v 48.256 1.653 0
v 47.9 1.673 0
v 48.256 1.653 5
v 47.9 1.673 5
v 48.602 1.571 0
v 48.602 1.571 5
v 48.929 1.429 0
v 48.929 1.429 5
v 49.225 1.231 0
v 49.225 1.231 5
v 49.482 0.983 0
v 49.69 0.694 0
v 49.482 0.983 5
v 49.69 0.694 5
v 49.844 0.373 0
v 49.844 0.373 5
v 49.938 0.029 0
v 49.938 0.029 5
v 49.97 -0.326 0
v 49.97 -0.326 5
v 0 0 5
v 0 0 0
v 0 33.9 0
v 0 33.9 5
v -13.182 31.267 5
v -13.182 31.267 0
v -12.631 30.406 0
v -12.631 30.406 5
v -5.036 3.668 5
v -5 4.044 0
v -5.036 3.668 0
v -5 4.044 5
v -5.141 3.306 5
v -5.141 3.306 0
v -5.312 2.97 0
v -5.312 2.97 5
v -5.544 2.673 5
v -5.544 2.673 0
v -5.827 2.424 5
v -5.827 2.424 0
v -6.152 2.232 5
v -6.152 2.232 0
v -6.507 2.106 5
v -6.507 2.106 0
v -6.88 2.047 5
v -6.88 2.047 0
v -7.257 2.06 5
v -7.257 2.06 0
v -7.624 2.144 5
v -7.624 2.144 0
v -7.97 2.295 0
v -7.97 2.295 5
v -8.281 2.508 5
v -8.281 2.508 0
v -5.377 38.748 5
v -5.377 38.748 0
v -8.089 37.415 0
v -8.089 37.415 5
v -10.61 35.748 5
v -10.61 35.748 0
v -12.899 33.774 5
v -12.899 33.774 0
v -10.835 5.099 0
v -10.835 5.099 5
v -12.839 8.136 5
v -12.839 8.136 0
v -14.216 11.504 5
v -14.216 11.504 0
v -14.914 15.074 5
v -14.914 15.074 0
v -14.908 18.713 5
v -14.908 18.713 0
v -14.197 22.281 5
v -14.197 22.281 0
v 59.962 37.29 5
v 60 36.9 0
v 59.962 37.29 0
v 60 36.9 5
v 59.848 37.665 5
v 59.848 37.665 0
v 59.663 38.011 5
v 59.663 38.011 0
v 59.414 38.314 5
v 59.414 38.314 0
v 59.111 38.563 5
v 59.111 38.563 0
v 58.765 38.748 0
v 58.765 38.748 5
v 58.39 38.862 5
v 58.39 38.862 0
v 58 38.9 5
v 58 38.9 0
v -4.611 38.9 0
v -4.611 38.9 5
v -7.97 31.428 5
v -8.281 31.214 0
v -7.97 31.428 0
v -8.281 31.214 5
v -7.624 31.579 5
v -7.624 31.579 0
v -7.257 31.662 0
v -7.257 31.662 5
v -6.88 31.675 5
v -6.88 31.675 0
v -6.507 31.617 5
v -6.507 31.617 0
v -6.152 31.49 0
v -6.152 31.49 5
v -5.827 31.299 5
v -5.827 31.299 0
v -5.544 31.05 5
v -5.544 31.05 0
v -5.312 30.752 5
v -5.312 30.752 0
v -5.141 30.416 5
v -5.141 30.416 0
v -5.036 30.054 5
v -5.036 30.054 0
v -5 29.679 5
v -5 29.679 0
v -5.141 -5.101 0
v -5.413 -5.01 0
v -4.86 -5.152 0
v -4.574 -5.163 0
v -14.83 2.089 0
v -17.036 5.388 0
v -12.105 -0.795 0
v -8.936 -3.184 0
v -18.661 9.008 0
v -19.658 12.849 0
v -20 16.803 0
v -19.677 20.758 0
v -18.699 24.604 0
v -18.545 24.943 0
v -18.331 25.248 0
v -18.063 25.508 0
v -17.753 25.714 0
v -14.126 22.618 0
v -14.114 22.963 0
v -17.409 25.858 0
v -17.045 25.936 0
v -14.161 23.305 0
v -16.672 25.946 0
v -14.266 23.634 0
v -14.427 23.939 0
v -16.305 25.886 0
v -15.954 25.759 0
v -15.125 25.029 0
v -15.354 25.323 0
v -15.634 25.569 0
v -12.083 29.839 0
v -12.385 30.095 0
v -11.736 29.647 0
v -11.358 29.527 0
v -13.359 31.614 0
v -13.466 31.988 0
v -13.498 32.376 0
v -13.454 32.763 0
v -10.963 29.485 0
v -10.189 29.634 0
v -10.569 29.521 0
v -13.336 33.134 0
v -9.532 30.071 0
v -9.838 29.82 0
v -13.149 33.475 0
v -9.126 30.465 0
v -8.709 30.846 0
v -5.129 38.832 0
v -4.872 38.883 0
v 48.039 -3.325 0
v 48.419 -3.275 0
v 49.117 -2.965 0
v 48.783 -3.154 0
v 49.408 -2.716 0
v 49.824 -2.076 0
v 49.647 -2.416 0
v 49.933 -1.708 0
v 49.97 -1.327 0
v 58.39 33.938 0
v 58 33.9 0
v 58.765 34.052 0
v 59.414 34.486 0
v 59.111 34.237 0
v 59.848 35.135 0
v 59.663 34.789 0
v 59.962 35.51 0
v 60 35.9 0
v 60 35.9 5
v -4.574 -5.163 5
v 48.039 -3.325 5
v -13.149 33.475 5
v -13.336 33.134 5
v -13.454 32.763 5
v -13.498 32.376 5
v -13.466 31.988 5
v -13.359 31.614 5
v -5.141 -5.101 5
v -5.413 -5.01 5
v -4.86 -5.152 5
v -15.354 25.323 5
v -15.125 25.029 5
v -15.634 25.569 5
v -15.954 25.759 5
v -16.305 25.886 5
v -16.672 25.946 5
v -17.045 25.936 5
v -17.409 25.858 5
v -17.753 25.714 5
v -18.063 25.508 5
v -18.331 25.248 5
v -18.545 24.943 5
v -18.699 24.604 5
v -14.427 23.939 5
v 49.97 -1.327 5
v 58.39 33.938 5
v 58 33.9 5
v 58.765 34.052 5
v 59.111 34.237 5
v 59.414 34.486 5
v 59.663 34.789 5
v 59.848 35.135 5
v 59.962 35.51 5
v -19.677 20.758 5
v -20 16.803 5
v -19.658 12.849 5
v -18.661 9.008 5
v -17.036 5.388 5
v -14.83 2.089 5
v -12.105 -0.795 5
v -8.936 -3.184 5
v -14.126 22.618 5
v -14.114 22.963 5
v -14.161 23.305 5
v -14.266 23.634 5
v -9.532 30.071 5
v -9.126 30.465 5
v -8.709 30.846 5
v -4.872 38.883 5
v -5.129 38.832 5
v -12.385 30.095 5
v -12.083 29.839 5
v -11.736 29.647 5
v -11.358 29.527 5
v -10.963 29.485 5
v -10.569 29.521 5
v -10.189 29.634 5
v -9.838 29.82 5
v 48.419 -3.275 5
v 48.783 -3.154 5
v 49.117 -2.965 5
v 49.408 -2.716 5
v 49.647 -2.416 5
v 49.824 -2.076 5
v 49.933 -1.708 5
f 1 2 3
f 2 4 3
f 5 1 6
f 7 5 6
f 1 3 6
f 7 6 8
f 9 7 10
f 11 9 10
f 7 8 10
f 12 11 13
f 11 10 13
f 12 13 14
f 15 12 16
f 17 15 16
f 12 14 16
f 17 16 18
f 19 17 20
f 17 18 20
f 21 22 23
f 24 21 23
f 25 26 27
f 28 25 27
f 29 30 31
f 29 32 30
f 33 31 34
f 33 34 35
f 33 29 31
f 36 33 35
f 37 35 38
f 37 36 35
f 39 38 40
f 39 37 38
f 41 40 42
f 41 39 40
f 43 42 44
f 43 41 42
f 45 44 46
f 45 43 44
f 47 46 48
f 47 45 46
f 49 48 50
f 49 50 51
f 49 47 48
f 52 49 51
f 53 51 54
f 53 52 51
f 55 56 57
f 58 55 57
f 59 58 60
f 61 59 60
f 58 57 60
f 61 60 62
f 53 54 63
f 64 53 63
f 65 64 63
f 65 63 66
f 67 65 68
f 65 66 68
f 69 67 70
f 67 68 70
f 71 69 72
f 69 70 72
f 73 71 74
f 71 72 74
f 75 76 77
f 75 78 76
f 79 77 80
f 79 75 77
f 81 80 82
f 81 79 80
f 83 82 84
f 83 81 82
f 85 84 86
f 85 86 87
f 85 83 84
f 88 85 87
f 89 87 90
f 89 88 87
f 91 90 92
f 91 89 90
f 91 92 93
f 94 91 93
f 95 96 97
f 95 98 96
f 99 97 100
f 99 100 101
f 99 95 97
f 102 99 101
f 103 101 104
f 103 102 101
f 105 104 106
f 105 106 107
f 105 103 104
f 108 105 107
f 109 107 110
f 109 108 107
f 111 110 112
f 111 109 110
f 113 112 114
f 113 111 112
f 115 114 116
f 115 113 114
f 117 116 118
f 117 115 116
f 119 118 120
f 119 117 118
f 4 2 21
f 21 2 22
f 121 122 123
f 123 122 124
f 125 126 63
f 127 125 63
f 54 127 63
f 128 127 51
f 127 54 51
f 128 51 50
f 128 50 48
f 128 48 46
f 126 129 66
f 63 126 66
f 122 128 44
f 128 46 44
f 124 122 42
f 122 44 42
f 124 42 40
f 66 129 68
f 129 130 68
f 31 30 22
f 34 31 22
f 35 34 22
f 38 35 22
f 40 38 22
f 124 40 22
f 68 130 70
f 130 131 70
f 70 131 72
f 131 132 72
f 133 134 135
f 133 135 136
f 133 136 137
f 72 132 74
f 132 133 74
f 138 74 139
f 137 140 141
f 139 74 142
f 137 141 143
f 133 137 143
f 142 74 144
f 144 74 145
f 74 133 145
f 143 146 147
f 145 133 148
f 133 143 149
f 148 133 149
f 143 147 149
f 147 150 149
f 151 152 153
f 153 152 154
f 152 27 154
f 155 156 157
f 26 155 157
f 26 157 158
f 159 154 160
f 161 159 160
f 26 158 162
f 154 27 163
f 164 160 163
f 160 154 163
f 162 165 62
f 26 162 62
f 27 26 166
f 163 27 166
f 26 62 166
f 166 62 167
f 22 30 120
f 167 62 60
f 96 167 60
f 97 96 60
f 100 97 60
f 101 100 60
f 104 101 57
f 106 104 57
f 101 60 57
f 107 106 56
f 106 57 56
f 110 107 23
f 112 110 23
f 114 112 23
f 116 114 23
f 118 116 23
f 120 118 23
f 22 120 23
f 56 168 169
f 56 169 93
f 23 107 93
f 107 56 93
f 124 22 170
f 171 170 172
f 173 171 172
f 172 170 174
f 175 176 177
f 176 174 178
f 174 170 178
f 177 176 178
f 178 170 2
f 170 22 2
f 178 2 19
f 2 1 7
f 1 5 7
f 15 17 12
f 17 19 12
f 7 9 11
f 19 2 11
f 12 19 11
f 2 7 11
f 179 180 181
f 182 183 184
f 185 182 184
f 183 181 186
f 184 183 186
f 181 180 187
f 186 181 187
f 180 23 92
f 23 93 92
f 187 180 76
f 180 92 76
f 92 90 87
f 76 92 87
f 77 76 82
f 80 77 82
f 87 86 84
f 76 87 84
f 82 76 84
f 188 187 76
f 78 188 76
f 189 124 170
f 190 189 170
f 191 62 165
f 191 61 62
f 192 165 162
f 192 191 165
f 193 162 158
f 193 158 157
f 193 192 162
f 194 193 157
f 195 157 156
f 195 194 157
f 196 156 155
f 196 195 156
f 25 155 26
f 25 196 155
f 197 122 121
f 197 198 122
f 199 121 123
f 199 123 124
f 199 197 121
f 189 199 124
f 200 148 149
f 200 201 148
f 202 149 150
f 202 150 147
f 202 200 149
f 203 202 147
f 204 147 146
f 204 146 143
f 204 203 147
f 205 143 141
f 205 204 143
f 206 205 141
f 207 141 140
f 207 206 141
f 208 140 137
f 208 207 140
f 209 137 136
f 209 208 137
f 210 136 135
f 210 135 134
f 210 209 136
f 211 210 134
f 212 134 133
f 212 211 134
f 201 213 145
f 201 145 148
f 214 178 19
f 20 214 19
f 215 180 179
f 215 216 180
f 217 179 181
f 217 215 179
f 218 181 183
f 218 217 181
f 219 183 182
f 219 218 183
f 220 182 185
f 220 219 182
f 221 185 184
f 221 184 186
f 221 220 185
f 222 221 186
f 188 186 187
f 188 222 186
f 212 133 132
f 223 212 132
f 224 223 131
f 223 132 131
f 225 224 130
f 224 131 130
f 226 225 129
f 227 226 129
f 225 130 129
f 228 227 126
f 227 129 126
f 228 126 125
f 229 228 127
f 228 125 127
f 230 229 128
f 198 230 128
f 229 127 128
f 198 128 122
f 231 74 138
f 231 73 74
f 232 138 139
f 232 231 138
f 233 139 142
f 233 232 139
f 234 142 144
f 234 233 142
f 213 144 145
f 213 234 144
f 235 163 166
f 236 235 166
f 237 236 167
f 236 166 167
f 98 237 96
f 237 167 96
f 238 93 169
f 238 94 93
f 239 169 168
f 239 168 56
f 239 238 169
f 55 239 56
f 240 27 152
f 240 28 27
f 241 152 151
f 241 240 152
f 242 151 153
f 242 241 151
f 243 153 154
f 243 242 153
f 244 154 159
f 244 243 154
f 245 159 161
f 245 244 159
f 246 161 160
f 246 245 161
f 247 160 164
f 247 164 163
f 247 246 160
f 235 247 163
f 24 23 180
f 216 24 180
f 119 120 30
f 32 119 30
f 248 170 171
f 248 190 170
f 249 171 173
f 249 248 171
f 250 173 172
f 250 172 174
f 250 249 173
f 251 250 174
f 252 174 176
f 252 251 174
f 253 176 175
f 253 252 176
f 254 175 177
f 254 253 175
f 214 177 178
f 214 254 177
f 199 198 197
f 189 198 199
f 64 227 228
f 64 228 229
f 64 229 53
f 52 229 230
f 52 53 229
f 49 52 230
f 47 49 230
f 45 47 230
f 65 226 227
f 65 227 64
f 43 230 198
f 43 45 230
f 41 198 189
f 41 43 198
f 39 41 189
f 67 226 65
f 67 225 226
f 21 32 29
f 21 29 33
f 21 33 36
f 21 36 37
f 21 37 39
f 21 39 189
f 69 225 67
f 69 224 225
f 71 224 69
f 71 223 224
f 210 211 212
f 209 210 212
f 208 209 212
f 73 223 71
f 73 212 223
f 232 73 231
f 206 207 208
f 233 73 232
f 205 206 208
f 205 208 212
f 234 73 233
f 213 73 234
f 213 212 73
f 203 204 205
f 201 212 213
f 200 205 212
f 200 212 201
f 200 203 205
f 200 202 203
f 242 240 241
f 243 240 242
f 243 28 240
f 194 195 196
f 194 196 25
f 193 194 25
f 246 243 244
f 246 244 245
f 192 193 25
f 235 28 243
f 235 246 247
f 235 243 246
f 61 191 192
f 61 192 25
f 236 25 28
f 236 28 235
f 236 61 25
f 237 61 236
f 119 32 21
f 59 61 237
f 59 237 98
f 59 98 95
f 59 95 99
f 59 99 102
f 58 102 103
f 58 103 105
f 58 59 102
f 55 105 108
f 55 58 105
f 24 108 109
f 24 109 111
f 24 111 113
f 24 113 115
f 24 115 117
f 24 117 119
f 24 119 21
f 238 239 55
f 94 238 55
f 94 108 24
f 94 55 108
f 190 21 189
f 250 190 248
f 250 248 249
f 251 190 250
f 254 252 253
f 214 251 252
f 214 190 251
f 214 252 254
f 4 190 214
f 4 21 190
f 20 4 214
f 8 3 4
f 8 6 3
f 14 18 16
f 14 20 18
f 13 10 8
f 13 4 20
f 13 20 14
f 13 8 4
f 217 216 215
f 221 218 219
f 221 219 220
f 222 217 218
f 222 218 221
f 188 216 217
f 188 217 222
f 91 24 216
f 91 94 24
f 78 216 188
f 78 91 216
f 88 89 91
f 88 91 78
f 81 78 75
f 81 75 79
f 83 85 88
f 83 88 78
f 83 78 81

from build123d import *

# Parameters (mm, degrees)
F1_DEPTH = 5
F2_R     = 2


with BuildPart() as f1:
    # F0 (on Top) → F1 (new body)
    with BuildSketch(Plane.XY):
        Polygon((49.969541351, 1.7449748351), (0, 0), (0, 33.9), (60, 33.9), (60, 38.9), (-5, 38.9), (-5, 33.4082755117), (-5, 0.3140729194), (-5, -5.177651569), (49.969541351, -3.2580728864), align=None)
        with BuildLine():
            Line((-5, 33.4082755117), (-5, 38.9))
            ThreePointArc((-5, 38.9), (-9.8858414628, 36.2755829056), (-14.0276237399, 32.5871345254))
            Line((-14.0276237399, 32.5871345254), (-11.1949861447, 28.1640846398))
            ThreePointArc((-11.1949861447, 28.1640846398), (-8.385603023, 31.1265256497), (-5, 33.4082755117))
        make_face()
        with BuildLine():
            ThreePointArc((-17.1309979161, 28.161794916), (-18.5720640821, 8.7607088143), (-5, -5.177651569))
            Line((-5, -5.177651569), (-5, 0.3140729194))
            ThreePointArc((-5, 0.3140729194), (-13.7193681247, 10.061847649), (-13.9141851806, 23.1388709719))
            Line((-13.9141851806, 23.1388709719), (-17.1309979161, 28.161794916))
        make_face()
    extrude(amount=F1_DEPTH)

    # F2
    f2_edges = [f1.edges().sort_by_distance(p)[0] for p in [
        (49.969541, 1.744975, 2.5),
        (49.969541, -3.258073, 2.5),
        (-5, -5.177652, 2.5),
        (-5, 0.314073, 2.5),
        (-5, 33.408276, 2.5),
        (60, 33.9, 2.5),
        (-17.130998, 28.161795, 2.5),
        (-14.027624, 32.587135, 2.5),
        (-13.914185, 23.138871, 2.5),
        (-11.194986, 28.164085, 2.5),
        (-5, 38.9, 2.5),
        (60, 38.9, 2.5),
    ]]
    fillet(f2_edges, radius=F2_R)


solid = f1.part
